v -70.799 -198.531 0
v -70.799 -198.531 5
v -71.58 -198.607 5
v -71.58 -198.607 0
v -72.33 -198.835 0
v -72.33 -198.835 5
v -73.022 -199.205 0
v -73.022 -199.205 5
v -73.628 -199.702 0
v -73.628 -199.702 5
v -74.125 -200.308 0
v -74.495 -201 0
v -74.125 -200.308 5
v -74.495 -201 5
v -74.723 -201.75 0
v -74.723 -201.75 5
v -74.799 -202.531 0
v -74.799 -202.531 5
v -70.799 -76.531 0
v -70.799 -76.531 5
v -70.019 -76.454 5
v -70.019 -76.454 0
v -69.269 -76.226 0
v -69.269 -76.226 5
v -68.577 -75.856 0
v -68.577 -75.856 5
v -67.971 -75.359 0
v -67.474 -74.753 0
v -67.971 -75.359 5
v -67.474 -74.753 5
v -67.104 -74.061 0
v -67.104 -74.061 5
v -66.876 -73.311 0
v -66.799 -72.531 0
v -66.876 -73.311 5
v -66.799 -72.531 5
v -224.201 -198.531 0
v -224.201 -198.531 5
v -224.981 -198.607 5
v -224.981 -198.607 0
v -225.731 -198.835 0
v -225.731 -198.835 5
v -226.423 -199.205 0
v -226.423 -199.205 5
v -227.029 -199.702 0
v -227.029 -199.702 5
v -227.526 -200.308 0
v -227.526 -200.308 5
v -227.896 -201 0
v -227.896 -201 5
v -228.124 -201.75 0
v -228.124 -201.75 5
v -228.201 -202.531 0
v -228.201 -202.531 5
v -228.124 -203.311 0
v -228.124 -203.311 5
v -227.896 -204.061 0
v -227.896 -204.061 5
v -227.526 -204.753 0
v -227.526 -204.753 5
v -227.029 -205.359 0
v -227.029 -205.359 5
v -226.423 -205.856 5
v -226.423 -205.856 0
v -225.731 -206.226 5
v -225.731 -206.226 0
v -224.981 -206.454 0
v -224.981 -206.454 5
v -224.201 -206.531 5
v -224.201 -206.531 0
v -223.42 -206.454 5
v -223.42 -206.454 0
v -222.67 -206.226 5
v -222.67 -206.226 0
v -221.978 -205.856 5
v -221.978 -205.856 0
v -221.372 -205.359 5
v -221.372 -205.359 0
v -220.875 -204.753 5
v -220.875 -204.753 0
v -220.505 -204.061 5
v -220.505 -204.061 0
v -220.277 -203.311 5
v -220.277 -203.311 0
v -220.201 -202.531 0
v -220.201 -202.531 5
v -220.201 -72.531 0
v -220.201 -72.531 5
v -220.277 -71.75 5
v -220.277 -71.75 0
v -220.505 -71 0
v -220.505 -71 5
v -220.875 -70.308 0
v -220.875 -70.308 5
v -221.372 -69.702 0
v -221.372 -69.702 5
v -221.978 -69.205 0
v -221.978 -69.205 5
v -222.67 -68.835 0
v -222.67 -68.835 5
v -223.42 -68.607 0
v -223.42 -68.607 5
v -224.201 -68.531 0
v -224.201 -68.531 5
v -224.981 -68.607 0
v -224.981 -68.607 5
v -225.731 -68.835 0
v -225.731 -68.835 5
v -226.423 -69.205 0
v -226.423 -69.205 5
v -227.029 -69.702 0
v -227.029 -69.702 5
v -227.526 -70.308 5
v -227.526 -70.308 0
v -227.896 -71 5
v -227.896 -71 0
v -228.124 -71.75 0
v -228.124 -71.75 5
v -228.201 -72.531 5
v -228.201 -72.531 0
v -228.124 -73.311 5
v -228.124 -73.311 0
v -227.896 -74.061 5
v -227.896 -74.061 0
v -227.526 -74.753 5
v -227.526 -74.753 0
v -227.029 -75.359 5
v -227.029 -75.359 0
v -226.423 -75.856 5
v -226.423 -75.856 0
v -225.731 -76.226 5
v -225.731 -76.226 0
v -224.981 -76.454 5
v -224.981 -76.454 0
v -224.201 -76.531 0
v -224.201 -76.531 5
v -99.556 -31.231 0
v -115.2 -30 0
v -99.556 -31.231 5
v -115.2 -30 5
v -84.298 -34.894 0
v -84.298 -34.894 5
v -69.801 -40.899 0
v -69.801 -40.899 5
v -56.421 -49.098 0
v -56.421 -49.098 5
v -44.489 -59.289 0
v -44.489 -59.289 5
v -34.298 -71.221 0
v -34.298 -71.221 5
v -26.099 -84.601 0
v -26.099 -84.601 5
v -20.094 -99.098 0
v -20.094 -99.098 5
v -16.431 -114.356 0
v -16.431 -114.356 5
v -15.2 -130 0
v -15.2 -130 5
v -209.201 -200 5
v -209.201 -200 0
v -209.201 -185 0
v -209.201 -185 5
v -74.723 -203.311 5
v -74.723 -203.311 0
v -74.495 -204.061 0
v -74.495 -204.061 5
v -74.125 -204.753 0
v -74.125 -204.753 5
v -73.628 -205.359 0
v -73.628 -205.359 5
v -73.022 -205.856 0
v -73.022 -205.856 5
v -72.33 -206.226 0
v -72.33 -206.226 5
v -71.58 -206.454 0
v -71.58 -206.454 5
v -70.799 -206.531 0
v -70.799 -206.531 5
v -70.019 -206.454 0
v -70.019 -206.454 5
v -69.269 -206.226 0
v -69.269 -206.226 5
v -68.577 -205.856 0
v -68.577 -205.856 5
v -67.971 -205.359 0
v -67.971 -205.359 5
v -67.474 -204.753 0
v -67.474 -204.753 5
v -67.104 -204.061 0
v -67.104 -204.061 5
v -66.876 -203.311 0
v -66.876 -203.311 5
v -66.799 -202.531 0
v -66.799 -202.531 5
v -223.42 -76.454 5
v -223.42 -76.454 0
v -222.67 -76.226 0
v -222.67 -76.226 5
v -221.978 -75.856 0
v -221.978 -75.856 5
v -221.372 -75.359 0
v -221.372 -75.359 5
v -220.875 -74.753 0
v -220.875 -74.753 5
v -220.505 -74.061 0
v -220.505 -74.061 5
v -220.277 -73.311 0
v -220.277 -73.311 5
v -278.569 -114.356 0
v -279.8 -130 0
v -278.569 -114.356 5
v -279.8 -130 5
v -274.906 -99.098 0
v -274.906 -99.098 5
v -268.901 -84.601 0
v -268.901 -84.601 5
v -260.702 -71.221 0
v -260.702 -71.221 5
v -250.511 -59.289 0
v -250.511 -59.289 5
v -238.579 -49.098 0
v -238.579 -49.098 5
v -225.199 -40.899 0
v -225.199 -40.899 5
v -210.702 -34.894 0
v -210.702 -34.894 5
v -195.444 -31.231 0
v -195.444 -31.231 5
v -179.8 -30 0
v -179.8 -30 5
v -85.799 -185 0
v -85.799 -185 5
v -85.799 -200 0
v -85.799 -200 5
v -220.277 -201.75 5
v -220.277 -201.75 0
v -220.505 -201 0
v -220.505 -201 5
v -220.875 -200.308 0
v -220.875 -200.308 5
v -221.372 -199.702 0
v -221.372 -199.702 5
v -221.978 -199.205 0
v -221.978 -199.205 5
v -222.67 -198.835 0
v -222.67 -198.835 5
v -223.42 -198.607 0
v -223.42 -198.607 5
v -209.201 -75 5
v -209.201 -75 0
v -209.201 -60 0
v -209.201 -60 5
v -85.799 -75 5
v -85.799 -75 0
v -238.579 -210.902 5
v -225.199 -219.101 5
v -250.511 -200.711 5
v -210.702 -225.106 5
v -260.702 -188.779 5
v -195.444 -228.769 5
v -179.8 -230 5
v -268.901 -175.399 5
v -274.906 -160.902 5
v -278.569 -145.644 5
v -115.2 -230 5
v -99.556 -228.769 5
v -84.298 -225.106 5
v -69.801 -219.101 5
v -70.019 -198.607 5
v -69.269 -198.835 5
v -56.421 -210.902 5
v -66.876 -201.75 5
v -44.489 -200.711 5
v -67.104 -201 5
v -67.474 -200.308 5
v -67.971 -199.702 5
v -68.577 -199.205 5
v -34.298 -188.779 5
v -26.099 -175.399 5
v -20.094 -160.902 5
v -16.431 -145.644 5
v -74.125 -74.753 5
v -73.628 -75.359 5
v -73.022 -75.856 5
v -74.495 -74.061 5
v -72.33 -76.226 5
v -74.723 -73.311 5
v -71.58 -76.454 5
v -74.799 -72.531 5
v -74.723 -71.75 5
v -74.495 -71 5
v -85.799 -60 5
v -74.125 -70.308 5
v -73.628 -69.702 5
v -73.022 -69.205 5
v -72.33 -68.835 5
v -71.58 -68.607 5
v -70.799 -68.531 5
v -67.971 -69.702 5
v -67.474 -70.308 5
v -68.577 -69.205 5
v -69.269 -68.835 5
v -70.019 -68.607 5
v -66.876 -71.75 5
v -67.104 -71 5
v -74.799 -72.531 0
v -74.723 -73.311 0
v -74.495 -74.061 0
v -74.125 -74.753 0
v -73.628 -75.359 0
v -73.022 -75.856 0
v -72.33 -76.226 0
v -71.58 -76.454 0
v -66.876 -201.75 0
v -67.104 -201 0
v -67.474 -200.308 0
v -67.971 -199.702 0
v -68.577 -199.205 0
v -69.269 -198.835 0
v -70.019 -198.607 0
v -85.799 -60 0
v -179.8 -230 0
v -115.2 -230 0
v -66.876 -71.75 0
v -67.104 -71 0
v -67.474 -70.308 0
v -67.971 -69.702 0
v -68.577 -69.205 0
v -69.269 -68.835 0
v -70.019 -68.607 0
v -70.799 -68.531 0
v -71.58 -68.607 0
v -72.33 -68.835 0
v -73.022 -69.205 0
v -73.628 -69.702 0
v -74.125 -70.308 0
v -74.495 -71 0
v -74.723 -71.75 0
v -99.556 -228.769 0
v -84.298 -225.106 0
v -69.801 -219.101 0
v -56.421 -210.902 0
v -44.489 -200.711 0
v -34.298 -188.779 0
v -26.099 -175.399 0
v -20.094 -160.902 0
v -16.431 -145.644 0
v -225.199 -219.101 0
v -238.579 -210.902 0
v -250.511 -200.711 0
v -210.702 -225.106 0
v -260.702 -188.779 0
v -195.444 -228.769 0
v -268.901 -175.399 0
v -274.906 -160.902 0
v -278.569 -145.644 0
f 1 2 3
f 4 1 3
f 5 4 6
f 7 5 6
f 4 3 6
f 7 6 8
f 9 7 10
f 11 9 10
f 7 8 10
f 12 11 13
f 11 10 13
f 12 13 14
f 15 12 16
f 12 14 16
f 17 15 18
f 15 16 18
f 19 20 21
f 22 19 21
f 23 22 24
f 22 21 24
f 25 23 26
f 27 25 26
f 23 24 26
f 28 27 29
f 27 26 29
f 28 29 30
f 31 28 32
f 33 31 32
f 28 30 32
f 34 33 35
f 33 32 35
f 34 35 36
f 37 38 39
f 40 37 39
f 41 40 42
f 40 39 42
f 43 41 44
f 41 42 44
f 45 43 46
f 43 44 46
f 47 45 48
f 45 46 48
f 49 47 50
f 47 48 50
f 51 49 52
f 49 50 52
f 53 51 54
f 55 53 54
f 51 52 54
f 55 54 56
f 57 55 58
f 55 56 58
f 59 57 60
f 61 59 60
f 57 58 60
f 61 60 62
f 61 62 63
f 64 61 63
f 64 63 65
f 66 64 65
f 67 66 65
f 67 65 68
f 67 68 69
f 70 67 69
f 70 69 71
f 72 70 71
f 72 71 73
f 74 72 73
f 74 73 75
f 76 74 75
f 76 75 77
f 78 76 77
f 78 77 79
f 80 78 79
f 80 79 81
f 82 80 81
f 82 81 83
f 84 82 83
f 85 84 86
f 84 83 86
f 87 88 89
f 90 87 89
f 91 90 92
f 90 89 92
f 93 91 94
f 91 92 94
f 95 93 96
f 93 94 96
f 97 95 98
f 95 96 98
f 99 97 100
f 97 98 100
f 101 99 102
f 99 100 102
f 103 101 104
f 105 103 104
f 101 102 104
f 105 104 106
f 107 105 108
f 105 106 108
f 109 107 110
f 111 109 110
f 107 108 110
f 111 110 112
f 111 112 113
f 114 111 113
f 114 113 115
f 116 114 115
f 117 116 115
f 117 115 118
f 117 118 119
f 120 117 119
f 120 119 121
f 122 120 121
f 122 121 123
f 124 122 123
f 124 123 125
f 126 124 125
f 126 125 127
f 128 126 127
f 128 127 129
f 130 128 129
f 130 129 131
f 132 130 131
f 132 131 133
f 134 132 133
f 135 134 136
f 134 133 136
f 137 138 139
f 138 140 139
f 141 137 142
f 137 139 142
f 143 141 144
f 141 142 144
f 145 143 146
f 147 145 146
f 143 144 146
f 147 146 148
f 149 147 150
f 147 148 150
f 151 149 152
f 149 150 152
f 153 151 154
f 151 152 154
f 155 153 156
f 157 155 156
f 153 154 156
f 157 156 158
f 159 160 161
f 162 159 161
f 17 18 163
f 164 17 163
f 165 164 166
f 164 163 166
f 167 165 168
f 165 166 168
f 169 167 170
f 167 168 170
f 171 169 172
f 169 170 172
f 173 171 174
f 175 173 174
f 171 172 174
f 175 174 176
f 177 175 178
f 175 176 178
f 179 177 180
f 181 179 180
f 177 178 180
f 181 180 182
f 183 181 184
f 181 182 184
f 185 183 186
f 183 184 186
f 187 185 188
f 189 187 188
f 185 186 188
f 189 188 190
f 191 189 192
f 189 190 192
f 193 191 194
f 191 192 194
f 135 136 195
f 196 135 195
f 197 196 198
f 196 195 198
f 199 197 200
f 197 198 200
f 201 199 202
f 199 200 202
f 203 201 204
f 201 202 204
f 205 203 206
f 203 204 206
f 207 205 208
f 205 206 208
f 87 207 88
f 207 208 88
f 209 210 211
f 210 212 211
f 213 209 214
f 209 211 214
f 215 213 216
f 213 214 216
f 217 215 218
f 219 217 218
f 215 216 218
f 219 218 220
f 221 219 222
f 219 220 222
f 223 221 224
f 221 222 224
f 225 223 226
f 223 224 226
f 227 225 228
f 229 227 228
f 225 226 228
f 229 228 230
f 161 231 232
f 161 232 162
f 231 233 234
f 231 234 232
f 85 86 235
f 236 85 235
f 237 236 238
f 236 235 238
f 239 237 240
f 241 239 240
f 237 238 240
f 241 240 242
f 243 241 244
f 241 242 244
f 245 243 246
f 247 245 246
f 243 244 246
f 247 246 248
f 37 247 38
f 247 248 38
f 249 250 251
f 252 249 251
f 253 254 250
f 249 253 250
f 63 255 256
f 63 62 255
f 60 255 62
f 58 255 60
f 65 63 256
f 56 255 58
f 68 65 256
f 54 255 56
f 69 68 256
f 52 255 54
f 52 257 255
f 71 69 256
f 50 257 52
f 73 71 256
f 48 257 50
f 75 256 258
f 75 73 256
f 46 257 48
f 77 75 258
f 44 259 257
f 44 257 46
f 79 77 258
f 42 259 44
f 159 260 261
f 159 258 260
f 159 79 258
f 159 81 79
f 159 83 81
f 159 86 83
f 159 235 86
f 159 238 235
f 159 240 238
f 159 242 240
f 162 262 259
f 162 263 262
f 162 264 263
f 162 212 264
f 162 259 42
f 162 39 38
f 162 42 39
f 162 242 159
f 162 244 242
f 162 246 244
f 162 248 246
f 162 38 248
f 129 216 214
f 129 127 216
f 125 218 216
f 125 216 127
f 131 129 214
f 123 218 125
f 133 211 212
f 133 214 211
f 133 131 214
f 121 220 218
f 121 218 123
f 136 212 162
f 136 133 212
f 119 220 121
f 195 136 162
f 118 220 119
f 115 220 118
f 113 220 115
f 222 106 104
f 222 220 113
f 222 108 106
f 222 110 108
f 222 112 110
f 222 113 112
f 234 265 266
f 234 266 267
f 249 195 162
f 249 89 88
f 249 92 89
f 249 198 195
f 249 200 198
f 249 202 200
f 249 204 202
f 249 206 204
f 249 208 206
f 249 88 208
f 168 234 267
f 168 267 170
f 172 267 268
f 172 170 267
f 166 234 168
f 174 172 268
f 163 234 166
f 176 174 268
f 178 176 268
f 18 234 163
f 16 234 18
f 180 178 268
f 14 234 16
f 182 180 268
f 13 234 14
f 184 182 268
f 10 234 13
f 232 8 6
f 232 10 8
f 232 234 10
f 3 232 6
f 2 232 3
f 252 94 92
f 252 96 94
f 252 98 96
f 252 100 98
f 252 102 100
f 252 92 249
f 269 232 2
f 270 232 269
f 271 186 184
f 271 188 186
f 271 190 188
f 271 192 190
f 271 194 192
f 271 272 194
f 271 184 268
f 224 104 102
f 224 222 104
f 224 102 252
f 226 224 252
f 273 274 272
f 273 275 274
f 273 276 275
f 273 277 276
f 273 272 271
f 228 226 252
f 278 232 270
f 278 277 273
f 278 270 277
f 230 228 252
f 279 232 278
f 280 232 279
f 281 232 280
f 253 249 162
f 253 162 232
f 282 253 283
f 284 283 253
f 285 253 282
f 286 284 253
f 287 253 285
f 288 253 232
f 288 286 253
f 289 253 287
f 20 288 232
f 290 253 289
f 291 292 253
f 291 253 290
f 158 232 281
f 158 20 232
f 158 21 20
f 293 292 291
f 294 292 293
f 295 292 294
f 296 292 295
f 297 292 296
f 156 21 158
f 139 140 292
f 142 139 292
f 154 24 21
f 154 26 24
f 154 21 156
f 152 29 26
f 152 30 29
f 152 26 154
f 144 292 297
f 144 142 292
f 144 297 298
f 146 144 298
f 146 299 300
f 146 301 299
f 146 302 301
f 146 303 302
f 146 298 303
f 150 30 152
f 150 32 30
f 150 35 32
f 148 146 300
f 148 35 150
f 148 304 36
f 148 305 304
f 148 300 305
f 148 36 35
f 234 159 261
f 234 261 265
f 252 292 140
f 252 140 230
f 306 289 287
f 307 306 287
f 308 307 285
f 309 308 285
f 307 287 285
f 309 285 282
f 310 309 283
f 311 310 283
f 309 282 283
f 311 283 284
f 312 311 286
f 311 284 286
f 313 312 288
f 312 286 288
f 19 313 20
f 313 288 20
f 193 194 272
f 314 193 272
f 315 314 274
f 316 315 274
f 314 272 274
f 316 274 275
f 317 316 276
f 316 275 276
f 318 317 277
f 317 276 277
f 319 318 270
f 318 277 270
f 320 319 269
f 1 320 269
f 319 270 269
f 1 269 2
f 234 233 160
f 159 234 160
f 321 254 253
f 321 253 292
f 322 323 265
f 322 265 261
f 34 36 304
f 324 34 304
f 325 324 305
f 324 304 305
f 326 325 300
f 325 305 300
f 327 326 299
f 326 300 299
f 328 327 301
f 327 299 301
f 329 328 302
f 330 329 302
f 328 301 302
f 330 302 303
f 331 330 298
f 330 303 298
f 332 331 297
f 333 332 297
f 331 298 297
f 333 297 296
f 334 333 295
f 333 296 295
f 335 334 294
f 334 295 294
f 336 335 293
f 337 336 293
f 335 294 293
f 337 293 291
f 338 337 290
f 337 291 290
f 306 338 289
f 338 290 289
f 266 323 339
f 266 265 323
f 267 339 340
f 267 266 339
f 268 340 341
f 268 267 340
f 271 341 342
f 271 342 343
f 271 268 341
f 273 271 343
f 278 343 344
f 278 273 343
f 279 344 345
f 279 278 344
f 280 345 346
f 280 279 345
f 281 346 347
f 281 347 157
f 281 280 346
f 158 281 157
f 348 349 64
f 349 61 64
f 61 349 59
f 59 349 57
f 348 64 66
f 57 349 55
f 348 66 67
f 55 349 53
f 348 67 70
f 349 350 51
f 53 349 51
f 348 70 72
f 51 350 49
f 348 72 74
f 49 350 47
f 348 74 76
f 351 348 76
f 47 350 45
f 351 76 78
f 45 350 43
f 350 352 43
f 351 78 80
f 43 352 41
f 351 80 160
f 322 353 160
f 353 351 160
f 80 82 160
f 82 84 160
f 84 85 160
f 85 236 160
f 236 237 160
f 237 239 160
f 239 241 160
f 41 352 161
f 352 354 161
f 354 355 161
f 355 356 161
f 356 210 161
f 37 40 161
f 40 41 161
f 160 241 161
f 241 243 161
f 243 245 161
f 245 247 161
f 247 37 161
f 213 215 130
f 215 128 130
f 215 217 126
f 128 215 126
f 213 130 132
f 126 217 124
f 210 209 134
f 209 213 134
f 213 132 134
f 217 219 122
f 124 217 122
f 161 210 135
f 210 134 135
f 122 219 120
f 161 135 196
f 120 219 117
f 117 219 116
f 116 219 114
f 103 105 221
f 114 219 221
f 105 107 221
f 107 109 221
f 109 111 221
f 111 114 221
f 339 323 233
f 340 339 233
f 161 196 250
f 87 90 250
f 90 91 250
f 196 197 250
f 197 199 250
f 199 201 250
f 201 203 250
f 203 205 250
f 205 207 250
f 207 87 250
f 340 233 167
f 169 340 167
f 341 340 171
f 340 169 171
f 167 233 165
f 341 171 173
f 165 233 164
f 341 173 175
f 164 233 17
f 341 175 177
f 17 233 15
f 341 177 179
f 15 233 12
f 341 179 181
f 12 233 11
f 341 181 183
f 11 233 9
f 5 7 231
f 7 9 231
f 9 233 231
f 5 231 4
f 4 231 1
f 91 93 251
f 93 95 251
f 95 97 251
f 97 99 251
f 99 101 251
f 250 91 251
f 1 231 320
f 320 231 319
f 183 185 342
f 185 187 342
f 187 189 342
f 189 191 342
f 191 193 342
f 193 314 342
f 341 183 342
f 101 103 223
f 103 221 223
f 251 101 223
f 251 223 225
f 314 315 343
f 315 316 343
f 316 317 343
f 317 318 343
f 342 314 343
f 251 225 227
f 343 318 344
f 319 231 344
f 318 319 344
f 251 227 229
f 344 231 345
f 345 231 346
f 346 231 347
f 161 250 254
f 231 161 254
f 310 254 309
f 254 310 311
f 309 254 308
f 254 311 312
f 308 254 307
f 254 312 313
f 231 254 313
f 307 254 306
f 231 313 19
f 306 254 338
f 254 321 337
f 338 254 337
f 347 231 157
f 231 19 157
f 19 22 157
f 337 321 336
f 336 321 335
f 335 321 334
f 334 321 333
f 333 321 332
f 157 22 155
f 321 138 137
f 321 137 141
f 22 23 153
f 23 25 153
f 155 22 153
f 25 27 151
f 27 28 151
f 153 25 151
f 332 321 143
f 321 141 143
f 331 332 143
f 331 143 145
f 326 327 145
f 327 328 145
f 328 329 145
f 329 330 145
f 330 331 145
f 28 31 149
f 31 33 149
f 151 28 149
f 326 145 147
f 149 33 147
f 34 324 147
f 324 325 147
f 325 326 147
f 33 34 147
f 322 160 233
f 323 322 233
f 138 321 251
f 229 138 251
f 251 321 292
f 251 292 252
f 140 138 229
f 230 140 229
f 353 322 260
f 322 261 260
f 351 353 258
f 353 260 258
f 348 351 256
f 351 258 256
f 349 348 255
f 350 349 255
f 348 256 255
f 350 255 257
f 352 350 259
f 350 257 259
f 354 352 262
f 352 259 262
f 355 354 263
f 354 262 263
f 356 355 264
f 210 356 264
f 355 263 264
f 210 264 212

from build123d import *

# Parameters (mm, degrees)
ESQUISSE1_W             = 295
ESQUISSE1_H             = 260
BOSS_EXTRU_1_DEPTH      = 5
ESQUISSE3_OUTSIDE_W     = 375.652
ESQUISSE3_OUTSIDE_H     = 340.652
ESQUISSE3_OUTSIDE_W_2   = 264.6
ESQUISSE3_OUTSIDE_H_2   = 200
ENL_V_MAT_EXTRU_2_DEPTH = 394.255642045
CONG_1_R                = 100
ENL_V_MAT_EXTRU_4_DEPTH = 363.233405417
ESQUISSE7_W             = 123.401082374
ESQUISSE7_H             = 15
ENL_V_MAT_EXTRU_6_DEPTH = 363.233405417


with BuildPart() as part:
    # Esquisse1 → Boss.-Extru.1 (new body)
    with BuildSketch(Plane.XY):
        with Locations((-147.5, -130)):
            Rectangle(ESQUISSE1_W, ESQUISSE1_H)
    extrude(amount=BOSS_EXTRU_1_DEPTH)

    # Esquisse3 outside → Enlèv. mat.-Extru.2 (cut, through all)
    with BuildSketch(Plane(origin=(0, 0, 0), x_dir=(-1, 0, 0), z_dir=(0, 0, -1))):
        with Locations((147.5, -130)):
            Rectangle(ESQUISSE3_OUTSIDE_W, ESQUISSE3_OUTSIDE_H)
        with Locations((147.5, -130)):
            Rectangle(ESQUISSE3_OUTSIDE_W_2, ESQUISSE3_OUTSIDE_H_2, mode=Mode.SUBTRACT)
    extrude(amount=-ENL_V_MAT_EXTRU_2_DEPTH, mode=Mode.SUBTRACT)

    # Congé1
    cong_1_edges = [part.edges().sort_by_distance(p)[0] for p in [
        (-279.8, -30, 2.5),
        (-15.2, -30, 2.5),
        (-279.8, -230, 2.5),
        (-15.2, -230, 2.5),
    ]]
    fillet(cong_1_edges, radius=CONG_1_R - 0.0001)  # a hair under: the kernel refuses the full size

    # Esquisse5 → Enlèv. mat.-Extru.4 (cut, through all)
    with BuildSketch(Plane.XY.offset(5)):
        with BuildLine():
            ThreePointArc((-70.799458813, -198.530608435), (-73.627885938, -199.70218131), (-74.799458813, -202.530608435))
            Line((-74.799458813, -202.530608435), (-70.799458813, -202.530608435))
            Line((-70.799458813, -202.530608435), (-70.799458813, -198.530608435))
        make_face()
        with BuildLine():
            Line((-70.799458813, -202.530608435), (-74.799458813, -202.530608435))
            ThreePointArc((-74.799458813, -202.530608435), (-70.799458813, -206.530608435), (-66.799458813, -202.530608435))
            ThreePointArc((-66.799458813, -202.530608435), (-67.971031689, -199.70218131), (-70.799458813, -198.530608435))
            Line((-70.799458813, -198.530608435), (-70.799458813, -202.530608435))
        make_face()
        with BuildLine():
            ThreePointArc((-224.200541187, -198.530608435), (-227.028968311, -205.35903556), (-220.200541187, -202.530608435))
            Line((-220.200541187, -202.530608435), (-224.200541187, -202.530608435))
            Line((-224.200541187, -202.530608435), (-224.200541187, -198.530608435))
        make_face()
        with BuildLine():
            Line((-224.200541187, -202.530608435), (-220.200541187, -202.530608435))
            ThreePointArc((-220.200541187, -202.530608435), (-221.372114062, -199.70218131), (-224.200541187, -198.530608435))
            Line((-224.200541187, -198.530608435), (-224.200541187, -202.530608435))
        make_face()
        with BuildLine():
            ThreePointArc((-220.200541187, -72.530608435), (-227.028968311, -69.70218131), (-224.200541187, -76.530608435))
            Line((-224.200541187, -76.530608435), (-224.200541187, -72.530608435))
            Line((-224.200541187, -72.530608435), (-220.200541187, -72.530608435))
        make_face()
        with BuildLine():
            Line((-224.200541187, -72.530608435), (-224.200541187, -76.530608435))
            ThreePointArc((-224.200541187, -76.530608435), (-221.372114062, -75.35903556), (-220.200541187, -72.530608435))
            Line((-220.200541187, -72.530608435), (-224.200541187, -72.530608435))
        make_face()
        with BuildLine():
            ThreePointArc((-74.799458813, -72.530608435), (-73.627885938, -75.35903556), (-70.799458813, -76.530608435))
            Line((-70.799458813, -76.530608435), (-70.799458813, -72.530608435))
            Line((-70.799458813, -72.530608435), (-74.799458813, -72.530608435))
        make_face()
        with BuildLine():
            Line((-70.799458813, -72.530608435), (-70.799458813, -76.530608435))
            ThreePointArc((-70.799458813, -76.530608435), (-67.971031689, -75.35903556), (-66.799458813, -72.530608435))
            ThreePointArc((-66.799458813, -72.530608435), (-70.799458813, -68.530608435), (-74.799458813, -72.530608435))
            Line((-74.799458813, -72.530608435), (-70.799458813, -72.530608435))
        make_face()
    extrude(amount=-ENL_V_MAT_EXTRU_4_DEPTH, mode=Mode.SUBTRACT)

    # Esquisse7 → Enlèv. mat.-Extru.6 (cut, through all)
    with BuildSketch(Plane(origin=(0, 0, 0), x_dir=(-1, 0, 0), z_dir=(0, 0, -1))):
        with Locations((147.5, -67.5)):
            Rectangle(ESQUISSE7_W, ESQUISSE7_H)
        with Locations((147.5, -192.5)):
            Rectangle(ESQUISSE7_W, ESQUISSE7_H)
    extrude(amount=-ENL_V_MAT_EXTRU_6_DEPTH, mode=Mode.SUBTRACT)


solid = part.part
